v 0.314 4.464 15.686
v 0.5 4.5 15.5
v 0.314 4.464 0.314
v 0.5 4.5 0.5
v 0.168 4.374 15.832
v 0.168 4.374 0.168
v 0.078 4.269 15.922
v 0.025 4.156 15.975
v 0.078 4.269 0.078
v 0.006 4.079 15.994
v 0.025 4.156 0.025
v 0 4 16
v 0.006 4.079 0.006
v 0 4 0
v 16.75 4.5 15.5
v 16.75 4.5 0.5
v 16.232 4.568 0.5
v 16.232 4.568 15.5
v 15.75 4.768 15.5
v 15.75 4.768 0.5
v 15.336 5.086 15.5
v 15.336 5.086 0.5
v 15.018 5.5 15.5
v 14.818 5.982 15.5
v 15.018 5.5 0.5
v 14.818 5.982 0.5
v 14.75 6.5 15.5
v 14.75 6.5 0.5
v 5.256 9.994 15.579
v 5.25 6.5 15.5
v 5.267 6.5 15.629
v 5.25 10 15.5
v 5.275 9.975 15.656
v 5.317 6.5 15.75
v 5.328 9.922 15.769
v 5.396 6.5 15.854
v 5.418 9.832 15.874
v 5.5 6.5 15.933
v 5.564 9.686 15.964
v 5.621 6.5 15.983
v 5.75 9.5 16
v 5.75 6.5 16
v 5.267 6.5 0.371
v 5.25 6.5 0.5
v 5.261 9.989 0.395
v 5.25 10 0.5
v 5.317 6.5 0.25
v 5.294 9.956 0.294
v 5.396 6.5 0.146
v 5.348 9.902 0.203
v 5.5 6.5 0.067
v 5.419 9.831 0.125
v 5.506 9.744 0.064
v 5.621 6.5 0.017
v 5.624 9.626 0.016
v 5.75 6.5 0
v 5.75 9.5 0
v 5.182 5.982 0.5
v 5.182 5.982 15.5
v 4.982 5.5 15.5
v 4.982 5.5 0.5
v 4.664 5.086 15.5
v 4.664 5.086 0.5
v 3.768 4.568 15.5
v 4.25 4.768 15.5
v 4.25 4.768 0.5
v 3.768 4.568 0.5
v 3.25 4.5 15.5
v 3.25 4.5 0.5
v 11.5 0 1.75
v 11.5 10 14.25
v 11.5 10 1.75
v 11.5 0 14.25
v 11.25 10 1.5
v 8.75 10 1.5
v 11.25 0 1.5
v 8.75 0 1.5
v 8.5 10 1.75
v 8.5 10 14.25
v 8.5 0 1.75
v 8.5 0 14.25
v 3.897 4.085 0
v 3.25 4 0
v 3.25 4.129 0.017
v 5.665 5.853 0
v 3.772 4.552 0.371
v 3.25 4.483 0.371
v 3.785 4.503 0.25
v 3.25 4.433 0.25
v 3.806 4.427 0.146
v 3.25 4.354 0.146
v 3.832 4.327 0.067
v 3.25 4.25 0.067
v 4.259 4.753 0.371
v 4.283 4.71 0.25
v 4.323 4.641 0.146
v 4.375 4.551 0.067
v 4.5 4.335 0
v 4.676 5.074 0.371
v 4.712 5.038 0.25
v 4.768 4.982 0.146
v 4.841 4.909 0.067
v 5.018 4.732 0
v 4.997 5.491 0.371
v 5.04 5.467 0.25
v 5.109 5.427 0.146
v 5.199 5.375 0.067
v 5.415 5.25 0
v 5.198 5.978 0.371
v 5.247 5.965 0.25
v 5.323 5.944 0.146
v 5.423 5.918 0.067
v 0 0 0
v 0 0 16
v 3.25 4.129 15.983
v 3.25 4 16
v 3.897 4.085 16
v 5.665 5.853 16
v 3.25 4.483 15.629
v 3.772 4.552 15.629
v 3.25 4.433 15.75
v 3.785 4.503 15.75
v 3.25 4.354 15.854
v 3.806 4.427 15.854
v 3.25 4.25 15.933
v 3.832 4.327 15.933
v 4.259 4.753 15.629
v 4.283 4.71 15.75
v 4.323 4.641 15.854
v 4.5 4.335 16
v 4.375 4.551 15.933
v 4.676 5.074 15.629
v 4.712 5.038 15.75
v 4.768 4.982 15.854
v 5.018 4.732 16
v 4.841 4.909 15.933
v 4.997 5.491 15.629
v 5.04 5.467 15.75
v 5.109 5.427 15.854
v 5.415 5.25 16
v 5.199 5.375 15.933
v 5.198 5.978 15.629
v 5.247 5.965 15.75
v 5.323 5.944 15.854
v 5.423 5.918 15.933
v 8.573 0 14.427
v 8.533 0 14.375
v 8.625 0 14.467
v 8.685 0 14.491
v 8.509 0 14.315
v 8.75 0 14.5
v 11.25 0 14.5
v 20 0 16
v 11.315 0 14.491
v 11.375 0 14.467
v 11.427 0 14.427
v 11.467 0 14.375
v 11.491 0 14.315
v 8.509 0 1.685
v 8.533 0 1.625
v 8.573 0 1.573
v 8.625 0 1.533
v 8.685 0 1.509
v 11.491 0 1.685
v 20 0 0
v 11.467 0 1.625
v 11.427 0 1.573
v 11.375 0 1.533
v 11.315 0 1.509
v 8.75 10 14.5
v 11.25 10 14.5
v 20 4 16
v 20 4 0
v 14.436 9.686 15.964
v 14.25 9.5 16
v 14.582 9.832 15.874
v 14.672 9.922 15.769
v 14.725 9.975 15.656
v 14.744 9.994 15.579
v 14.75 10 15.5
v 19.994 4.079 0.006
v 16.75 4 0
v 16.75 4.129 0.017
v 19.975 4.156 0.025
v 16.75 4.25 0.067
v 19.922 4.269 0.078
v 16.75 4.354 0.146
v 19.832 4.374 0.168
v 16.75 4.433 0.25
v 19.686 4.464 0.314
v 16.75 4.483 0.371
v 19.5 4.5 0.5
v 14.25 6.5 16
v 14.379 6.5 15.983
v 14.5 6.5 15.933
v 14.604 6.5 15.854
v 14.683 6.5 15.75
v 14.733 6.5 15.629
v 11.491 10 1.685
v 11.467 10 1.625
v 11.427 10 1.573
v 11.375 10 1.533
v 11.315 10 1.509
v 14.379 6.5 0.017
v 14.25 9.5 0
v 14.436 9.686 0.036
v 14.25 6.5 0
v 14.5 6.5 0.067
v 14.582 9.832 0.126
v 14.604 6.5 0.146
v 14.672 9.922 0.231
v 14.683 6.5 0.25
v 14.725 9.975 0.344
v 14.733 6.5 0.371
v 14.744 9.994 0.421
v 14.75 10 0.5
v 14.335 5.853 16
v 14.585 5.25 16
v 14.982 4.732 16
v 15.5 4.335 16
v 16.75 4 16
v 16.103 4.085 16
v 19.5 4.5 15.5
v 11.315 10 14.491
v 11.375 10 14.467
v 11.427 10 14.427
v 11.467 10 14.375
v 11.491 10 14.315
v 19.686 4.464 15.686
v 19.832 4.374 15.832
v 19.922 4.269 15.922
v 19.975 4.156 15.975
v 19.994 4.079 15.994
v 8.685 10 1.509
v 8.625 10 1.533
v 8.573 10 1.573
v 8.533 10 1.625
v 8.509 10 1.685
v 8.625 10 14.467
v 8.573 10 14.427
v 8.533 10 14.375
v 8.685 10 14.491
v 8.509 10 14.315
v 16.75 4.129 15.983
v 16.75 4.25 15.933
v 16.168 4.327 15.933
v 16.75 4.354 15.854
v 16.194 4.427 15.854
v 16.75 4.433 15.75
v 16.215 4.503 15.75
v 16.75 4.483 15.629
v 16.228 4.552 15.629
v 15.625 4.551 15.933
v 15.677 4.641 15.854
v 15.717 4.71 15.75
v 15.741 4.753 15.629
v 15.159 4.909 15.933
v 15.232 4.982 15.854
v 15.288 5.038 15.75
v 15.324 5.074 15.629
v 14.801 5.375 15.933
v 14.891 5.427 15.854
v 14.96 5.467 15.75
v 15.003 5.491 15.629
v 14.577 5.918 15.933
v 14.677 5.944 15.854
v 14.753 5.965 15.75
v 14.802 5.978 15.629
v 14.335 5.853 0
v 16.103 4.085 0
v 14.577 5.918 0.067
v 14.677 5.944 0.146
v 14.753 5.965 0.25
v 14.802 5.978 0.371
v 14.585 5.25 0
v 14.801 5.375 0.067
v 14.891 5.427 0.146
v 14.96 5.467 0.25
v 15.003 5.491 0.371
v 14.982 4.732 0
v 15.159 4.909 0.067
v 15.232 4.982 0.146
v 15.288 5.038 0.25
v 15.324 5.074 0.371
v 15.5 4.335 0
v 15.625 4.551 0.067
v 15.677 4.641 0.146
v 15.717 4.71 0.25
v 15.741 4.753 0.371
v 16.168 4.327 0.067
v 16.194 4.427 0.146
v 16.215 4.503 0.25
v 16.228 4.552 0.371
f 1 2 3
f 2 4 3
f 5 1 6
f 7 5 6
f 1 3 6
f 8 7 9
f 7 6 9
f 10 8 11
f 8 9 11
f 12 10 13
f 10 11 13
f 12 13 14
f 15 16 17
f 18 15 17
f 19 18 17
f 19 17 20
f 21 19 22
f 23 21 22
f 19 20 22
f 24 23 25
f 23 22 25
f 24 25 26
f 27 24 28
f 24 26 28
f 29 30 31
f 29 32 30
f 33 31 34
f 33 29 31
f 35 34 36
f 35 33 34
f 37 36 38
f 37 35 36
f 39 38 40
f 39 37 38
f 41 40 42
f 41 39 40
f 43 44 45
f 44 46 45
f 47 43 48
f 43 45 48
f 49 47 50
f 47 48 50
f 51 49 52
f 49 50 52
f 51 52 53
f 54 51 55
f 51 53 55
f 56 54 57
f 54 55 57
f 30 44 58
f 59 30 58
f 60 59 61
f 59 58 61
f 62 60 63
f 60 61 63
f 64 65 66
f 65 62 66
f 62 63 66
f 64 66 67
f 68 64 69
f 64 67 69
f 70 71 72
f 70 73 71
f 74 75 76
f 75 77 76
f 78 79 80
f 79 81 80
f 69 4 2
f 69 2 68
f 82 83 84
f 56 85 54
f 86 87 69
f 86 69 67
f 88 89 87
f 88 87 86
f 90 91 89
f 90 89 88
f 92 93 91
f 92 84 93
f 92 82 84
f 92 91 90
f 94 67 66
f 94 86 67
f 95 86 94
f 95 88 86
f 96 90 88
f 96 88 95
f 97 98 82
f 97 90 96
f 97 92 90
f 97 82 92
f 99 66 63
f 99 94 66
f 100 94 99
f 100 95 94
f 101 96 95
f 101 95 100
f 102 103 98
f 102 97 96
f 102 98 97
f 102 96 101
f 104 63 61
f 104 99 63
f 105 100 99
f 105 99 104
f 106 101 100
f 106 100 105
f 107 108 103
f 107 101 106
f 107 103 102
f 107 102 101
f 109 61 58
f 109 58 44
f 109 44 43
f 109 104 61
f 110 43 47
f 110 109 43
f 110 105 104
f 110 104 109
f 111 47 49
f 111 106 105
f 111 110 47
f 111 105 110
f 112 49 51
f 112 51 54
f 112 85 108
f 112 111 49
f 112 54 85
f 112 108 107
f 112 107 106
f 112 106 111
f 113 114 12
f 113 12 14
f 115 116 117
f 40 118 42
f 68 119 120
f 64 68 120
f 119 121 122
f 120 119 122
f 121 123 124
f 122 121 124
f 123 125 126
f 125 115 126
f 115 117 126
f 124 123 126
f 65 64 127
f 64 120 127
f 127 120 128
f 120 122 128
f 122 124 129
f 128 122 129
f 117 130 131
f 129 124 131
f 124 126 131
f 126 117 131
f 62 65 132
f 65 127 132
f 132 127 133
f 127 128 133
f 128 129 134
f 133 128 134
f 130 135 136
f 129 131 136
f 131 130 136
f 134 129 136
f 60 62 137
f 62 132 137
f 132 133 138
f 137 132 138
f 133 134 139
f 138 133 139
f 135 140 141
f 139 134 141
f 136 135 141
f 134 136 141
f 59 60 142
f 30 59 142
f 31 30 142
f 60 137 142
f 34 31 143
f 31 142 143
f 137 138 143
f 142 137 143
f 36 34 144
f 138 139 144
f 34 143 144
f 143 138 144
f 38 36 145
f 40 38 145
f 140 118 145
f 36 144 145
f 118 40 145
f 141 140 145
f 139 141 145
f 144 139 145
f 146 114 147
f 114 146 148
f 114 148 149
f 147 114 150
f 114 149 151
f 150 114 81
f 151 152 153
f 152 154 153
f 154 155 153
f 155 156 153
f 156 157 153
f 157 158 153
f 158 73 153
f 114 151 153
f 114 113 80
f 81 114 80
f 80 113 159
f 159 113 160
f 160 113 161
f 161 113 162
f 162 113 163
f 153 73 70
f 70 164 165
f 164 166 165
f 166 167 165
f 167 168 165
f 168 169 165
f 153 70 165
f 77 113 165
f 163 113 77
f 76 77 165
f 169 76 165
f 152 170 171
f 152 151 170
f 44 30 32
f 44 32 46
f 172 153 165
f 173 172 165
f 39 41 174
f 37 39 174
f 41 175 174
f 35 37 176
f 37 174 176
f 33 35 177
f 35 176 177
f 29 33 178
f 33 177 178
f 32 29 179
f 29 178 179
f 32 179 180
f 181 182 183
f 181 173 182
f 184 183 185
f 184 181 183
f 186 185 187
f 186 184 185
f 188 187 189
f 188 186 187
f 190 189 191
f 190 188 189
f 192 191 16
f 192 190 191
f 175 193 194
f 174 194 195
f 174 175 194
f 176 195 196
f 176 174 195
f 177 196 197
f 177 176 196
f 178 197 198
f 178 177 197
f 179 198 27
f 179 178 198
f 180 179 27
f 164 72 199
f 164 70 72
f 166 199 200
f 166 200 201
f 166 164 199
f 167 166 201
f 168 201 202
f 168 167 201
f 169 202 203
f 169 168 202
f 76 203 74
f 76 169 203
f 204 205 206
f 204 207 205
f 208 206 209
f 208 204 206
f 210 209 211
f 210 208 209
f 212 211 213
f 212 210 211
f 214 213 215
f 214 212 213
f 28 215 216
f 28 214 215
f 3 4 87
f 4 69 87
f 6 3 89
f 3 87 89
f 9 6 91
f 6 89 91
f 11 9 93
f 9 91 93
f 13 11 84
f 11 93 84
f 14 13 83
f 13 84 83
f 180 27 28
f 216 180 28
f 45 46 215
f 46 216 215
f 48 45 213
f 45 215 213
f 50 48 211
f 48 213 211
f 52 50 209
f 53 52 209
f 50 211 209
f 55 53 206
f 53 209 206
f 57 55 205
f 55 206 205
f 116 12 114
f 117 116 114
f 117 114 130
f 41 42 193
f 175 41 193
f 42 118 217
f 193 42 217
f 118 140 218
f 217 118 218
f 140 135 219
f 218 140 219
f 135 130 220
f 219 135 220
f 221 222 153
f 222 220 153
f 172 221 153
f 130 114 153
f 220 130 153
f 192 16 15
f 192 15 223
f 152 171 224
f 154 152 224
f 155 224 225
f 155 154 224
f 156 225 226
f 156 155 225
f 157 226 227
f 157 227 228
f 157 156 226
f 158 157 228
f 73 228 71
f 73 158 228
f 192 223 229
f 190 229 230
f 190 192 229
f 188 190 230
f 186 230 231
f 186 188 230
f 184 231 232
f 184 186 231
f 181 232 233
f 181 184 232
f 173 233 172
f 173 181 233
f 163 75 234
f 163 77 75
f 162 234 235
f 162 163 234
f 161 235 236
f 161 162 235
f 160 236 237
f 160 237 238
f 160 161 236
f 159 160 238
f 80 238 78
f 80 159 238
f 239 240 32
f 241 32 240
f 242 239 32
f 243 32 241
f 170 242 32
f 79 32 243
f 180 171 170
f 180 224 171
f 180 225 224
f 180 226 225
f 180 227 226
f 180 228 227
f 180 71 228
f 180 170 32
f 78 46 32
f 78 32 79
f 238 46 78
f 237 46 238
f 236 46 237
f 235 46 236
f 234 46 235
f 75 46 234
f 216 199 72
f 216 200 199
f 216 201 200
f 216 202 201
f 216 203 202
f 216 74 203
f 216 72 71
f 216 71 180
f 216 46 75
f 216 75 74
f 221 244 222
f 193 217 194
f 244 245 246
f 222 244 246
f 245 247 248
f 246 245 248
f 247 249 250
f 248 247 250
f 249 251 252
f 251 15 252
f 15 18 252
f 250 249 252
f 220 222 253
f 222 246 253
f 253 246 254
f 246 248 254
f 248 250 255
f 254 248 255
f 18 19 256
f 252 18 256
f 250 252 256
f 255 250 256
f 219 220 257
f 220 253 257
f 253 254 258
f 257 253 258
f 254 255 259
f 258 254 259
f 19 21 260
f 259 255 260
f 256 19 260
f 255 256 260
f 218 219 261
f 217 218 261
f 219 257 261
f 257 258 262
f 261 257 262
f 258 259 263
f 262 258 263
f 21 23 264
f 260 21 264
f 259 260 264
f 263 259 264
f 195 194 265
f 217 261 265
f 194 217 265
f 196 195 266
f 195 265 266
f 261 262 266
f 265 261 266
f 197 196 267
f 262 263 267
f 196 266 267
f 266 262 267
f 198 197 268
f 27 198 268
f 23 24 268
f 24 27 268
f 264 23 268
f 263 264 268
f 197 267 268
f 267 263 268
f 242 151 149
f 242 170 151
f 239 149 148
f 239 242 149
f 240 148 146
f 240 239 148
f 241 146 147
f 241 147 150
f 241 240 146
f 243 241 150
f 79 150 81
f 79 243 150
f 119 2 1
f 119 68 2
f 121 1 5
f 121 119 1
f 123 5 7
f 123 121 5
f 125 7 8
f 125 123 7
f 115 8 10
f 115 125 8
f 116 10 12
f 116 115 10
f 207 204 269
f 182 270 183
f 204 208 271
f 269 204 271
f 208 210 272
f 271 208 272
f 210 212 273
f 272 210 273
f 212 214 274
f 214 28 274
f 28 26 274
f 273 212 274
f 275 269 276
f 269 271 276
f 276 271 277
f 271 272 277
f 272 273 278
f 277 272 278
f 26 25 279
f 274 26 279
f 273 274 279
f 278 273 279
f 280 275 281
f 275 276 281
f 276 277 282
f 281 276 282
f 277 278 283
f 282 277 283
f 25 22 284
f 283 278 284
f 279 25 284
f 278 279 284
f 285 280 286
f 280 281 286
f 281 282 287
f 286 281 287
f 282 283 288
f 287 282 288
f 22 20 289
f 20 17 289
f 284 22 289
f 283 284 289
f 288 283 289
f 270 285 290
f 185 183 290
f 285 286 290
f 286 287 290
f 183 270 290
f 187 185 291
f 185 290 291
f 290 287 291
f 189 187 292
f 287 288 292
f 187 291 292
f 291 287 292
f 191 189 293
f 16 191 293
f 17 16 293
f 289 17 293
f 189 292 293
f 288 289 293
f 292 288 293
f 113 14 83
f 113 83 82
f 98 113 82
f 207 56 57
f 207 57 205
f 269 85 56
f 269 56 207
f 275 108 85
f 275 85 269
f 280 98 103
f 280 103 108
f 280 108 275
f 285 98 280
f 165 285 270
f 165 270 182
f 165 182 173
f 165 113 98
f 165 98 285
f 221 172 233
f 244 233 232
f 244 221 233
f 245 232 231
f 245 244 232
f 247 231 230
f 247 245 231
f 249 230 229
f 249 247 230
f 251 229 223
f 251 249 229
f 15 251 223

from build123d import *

# Parameters (mm, degrees)
SKETCH1_W           = 20
SKETCH1_H           = 16
SKETCH1_W_2         = 3
SKETCH1_H_2         = 13
BOSS_EXTRUDE1_DEPTH = 4.5
SKETCH2_W           = 9.5
SKETCH2_H           = 16
SKETCH2_W_2         = 3
SKETCH2_H_2         = 13
BOSS_EXTRUDE2_DEPTH = 5.5
FILLET1_R           = 2
FILLET2_R           = 0.5
FILLET3_R           = 0.25


with BuildPart() as part:
    # Sketch1 → Boss-Extrude1 (new body)
    with BuildSketch(Plane(origin=(0, 0, 0), x_dir=(1, 0, 0), z_dir=(0, 1, 0))):
        with Locations((10, -8)):
            Rectangle(SKETCH1_W, SKETCH1_H)
        with Locations((10, -8)):
            Rectangle(SKETCH1_W_2, SKETCH1_H_2, mode=Mode.SUBTRACT)
    extrude(amount=BOSS_EXTRUDE1_DEPTH)

    # Sketch2 → Boss-Extrude2 (add)
    with BuildSketch(Plane(origin=(0, 4.5, 0), x_dir=(1, 0, 0), z_dir=(0, 1, 0))):
        with Locations((10, -8)):
            Rectangle(SKETCH2_W, SKETCH2_H)
        with Locations((10, -8)):
            Rectangle(SKETCH2_W_2, SKETCH2_H_2, mode=Mode.SUBTRACT)
    extrude(amount=BOSS_EXTRUDE2_DEPTH)

    # Fillet1
    fillet1_edges = [part.edges().sort_by_distance(p)[0] for p in [
        (5.25, 4.5, 8),
        (14.75, 4.5, 8),
    ]]
    fillet(fillet1_edges, radius=FILLET1_R)

    # Fillet2
    fillet2_edges = [part.edges().sort_by_distance(p)[0] for p in [
        (20, 4.5, 8),
        (18.375, 4.5, 0),
        (10, 10, 16),
        (10, 10, 0),
        (5.25, 8.25, 0),
        (5.25, 8.25, 16),
        (14.75, 8.25, 16),
        (14.75, 8.25, 0),
        (0, 4.5, 8),
        (1.625, 4.5, 0),
        (18.375, 4.5, 16),
        (4.664213562, 5.085786438, 16),
        (4.664213562, 5.085786438, 0),
        (15.335786438, 5.085786438, 0),
        (15.335786438, 5.085786438, 16),
        (1.625, 4.5, 16),
    ]]
    fillet(fillet2_edges, radius=FILLET2_R)

    # Fillet3
    fillet3_edges = [part.edges().sort_by_distance(p)[0] for p in [
        (8.5, 5, 1.5),
        (8.5, 5, 14.5),
        (11.5, 5, 14.5),
        (11.5, 5, 1.5),
    ]]
    fillet(fillet3_edges, radius=FILLET3_R)


solid = part.part
